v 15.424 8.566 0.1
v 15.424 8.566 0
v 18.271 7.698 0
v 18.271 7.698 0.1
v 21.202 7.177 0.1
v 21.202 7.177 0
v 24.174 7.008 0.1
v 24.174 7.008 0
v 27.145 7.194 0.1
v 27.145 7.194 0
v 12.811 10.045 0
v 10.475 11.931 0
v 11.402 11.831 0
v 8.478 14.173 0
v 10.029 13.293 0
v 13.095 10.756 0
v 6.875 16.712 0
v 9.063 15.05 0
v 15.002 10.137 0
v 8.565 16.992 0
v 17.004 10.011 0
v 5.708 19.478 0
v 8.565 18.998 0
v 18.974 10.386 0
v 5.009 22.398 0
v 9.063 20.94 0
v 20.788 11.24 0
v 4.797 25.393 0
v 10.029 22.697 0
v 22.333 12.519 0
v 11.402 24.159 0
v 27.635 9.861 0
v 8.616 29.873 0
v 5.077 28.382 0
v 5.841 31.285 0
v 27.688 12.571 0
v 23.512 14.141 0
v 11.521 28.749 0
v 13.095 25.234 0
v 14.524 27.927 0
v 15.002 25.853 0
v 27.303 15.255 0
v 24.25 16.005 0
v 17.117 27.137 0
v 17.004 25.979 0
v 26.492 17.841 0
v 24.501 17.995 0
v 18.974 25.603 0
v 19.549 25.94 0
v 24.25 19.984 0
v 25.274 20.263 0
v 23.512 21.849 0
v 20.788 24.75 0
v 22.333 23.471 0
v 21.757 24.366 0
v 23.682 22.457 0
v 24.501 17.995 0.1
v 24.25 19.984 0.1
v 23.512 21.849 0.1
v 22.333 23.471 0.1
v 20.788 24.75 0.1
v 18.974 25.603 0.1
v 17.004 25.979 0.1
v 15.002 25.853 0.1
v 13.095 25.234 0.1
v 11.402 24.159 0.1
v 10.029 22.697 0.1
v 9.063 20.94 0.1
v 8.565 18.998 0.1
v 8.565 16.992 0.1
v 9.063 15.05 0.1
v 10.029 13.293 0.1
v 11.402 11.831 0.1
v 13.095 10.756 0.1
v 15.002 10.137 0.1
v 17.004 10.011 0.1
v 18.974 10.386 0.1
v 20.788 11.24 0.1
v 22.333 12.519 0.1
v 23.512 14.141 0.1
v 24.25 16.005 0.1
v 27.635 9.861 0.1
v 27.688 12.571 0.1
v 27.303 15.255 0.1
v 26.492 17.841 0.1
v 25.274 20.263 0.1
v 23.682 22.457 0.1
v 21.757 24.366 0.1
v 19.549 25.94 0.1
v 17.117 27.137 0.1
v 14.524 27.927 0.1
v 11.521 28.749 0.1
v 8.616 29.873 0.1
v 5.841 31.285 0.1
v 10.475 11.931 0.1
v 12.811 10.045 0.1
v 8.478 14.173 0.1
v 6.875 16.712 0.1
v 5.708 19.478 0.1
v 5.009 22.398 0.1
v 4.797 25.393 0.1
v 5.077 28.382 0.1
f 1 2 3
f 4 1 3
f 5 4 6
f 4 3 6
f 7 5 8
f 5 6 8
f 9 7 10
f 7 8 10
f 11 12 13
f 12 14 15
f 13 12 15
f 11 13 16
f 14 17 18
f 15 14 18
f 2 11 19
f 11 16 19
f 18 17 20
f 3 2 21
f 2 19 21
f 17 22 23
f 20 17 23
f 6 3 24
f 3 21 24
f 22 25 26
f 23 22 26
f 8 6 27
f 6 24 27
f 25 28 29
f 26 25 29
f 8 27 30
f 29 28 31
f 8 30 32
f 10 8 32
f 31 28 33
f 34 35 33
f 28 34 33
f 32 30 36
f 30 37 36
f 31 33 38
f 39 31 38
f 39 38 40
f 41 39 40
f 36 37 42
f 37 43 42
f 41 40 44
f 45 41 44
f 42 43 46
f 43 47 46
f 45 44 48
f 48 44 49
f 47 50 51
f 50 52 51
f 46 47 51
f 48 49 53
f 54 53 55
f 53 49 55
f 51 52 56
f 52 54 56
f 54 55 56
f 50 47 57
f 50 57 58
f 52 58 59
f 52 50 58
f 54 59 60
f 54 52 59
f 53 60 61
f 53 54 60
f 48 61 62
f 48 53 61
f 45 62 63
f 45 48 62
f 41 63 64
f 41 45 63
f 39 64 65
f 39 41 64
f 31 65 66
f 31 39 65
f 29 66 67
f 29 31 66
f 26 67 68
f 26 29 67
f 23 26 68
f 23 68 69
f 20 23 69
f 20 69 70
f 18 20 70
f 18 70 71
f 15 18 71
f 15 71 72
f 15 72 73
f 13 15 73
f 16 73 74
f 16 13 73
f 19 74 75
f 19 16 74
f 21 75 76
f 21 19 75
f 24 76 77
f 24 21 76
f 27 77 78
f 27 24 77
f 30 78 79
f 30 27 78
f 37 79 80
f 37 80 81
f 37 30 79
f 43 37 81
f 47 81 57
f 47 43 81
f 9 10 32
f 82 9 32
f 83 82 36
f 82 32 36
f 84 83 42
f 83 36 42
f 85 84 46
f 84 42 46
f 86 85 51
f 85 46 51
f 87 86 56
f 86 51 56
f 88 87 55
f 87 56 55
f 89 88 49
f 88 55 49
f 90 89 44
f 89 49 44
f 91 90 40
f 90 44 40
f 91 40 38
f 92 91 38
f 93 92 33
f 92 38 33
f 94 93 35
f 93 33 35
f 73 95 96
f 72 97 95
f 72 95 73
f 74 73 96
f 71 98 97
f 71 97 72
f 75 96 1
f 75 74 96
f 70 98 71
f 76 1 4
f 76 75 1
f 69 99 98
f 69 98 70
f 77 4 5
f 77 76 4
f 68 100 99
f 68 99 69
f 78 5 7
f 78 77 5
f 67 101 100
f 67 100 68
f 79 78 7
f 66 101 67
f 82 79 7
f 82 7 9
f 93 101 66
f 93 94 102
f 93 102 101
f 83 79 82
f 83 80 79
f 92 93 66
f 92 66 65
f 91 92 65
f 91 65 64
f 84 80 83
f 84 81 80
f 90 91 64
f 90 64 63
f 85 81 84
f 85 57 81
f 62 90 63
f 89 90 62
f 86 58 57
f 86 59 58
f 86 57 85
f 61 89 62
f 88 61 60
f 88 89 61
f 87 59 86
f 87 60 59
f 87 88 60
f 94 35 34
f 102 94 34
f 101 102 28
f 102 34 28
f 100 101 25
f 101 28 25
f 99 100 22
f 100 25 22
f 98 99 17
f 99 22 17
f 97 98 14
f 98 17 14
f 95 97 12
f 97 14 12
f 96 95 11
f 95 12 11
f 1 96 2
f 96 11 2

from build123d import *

# Parameters (mm, degrees)
MODEL_R                 = 8
SALIENTE_EXTRUIR1_DEPTH = 0.1


with BuildPart() as part:
    # Model → Saliente-Extruir1 (new body)
    with BuildSketch(Plane.XY):
        with BuildLine():
            ThreePointArc((27.14548024, 7.194414678), (25.273911912, 20.263089859), (14.523964876, 27.926749411))
            ThreePointArc((14.523964876, 27.926749411), (10.054231622, 29.274256382), (5.841127337, 31.28523691))
            ThreePointArc((5.841127337, 31.28523691), (6.23485784, 18.070799585), (15.423765374, 8.566045203))
            ThreePointArc((15.423765374, 8.566045203), (21.202282113, 7.176560753), (27.14548024, 7.194414678))
        make_face()
        with Locations((16.501428973, 17.994891823)):
            Circle(MODEL_R, mode=Mode.SUBTRACT)
    extrude(amount=SALIENTE_EXTRUIR1_DEPTH)


solid = part.part
